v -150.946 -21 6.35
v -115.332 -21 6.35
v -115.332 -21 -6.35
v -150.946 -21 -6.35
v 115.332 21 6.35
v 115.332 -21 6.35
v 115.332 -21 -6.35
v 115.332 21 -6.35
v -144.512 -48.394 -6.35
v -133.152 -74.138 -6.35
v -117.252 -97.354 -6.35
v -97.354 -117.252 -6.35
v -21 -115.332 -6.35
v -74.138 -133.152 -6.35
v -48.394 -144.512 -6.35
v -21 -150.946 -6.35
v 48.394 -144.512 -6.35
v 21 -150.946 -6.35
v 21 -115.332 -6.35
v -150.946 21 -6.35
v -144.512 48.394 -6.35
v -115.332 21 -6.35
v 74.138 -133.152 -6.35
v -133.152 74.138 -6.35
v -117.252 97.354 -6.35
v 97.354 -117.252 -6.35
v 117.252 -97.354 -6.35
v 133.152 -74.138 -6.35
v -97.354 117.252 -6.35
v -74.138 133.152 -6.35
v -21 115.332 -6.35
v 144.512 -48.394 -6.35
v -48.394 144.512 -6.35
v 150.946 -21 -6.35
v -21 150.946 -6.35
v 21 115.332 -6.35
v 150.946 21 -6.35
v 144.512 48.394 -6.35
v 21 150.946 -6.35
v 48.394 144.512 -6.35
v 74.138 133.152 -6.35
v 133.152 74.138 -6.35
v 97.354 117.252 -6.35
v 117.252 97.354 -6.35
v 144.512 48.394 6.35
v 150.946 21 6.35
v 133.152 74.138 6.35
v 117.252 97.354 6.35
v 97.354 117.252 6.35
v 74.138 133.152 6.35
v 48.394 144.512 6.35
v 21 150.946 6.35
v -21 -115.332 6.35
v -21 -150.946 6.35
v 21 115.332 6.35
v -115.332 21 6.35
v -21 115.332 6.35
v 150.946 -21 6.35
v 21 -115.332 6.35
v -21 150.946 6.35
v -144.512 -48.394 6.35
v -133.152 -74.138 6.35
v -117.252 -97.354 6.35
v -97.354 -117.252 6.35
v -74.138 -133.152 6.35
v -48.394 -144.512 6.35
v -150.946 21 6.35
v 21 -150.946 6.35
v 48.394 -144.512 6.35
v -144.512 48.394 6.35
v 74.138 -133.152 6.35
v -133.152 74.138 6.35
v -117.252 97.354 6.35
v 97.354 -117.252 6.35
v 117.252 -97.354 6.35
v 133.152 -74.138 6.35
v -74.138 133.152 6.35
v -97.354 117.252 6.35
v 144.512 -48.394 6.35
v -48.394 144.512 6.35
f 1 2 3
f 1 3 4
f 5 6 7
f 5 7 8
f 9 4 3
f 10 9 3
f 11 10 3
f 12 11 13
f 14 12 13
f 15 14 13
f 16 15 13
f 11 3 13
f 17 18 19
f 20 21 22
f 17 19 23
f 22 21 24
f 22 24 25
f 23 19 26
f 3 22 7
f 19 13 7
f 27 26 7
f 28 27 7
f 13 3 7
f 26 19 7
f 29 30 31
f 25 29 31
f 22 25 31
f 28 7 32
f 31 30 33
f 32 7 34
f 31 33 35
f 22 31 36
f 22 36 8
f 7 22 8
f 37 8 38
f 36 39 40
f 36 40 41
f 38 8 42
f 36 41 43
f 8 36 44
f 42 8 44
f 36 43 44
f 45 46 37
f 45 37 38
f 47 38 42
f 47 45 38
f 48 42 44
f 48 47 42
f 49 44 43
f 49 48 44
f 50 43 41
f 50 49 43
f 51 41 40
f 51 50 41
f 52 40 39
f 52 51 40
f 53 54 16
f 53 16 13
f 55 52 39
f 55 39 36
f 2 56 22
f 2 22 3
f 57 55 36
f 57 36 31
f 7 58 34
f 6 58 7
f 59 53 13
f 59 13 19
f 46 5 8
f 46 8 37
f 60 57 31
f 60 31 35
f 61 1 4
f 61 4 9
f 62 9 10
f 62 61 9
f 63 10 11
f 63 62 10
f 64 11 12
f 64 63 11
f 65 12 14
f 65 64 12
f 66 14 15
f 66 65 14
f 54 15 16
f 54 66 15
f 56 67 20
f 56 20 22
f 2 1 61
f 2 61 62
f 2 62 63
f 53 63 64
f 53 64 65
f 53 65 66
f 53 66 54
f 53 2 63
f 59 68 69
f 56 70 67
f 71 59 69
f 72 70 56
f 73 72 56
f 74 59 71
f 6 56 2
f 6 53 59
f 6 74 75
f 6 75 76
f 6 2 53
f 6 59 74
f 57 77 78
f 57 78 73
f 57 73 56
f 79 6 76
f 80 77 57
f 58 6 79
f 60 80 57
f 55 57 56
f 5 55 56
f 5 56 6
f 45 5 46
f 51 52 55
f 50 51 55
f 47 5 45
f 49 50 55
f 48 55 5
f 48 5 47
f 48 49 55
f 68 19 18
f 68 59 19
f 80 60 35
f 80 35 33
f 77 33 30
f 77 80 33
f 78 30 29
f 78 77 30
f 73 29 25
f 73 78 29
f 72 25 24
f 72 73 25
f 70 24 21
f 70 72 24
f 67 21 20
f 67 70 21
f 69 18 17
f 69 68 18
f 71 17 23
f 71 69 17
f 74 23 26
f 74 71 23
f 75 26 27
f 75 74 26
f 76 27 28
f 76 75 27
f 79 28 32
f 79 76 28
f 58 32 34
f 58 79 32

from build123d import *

# Parameters (mm, degrees)
BOSS_EXTRUDE1_DEPTH = 6.35


with BuildPart() as part:
    # Sketch1 → Boss-Extrude1 (new, symmetric)
    with BuildSketch(Plane.XY):
        with BuildLine():
            Line((150.946215587, -21), (115.332, -21))
            Line((115.332, -21), (115.332, 21))
            Line((115.332, 21), (150.946215587, 21))
            ThreePointArc((150.946215587, 21), (107.763073453, 107.763073453), (21, 150.946215587))
            Line((21, 150.946215587), (21, 115.332))
            Line((21, 115.332), (-21, 115.332))
            Line((-21, 115.332), (-21, 150.946215587))
            ThreePointArc((-21, 150.946215587), (-107.763073453, 107.763073453), (-150.946215587, 21))
            Line((-150.946215587, 21), (-115.332, 21))
            Line((-115.332, 21), (-115.332, -21))
            Line((-115.332, -21), (-150.946215587, -21))
            ThreePointArc((-150.946215587, -21), (-107.763073453, -107.763073453), (-21, -150.946215587))
            Line((-21, -150.946215587), (-21, -115.332))
            Line((-21, -115.332), (21, -115.332))
            Line((21, -115.332), (21, -150.946215587))
            ThreePointArc((21, -150.946215587), (107.763073453, -107.763073453), (150.946215587, -21))
        make_face()
    extrude(amount=BOSS_EXTRUDE1_DEPTH, both=True)


solid = part.part
